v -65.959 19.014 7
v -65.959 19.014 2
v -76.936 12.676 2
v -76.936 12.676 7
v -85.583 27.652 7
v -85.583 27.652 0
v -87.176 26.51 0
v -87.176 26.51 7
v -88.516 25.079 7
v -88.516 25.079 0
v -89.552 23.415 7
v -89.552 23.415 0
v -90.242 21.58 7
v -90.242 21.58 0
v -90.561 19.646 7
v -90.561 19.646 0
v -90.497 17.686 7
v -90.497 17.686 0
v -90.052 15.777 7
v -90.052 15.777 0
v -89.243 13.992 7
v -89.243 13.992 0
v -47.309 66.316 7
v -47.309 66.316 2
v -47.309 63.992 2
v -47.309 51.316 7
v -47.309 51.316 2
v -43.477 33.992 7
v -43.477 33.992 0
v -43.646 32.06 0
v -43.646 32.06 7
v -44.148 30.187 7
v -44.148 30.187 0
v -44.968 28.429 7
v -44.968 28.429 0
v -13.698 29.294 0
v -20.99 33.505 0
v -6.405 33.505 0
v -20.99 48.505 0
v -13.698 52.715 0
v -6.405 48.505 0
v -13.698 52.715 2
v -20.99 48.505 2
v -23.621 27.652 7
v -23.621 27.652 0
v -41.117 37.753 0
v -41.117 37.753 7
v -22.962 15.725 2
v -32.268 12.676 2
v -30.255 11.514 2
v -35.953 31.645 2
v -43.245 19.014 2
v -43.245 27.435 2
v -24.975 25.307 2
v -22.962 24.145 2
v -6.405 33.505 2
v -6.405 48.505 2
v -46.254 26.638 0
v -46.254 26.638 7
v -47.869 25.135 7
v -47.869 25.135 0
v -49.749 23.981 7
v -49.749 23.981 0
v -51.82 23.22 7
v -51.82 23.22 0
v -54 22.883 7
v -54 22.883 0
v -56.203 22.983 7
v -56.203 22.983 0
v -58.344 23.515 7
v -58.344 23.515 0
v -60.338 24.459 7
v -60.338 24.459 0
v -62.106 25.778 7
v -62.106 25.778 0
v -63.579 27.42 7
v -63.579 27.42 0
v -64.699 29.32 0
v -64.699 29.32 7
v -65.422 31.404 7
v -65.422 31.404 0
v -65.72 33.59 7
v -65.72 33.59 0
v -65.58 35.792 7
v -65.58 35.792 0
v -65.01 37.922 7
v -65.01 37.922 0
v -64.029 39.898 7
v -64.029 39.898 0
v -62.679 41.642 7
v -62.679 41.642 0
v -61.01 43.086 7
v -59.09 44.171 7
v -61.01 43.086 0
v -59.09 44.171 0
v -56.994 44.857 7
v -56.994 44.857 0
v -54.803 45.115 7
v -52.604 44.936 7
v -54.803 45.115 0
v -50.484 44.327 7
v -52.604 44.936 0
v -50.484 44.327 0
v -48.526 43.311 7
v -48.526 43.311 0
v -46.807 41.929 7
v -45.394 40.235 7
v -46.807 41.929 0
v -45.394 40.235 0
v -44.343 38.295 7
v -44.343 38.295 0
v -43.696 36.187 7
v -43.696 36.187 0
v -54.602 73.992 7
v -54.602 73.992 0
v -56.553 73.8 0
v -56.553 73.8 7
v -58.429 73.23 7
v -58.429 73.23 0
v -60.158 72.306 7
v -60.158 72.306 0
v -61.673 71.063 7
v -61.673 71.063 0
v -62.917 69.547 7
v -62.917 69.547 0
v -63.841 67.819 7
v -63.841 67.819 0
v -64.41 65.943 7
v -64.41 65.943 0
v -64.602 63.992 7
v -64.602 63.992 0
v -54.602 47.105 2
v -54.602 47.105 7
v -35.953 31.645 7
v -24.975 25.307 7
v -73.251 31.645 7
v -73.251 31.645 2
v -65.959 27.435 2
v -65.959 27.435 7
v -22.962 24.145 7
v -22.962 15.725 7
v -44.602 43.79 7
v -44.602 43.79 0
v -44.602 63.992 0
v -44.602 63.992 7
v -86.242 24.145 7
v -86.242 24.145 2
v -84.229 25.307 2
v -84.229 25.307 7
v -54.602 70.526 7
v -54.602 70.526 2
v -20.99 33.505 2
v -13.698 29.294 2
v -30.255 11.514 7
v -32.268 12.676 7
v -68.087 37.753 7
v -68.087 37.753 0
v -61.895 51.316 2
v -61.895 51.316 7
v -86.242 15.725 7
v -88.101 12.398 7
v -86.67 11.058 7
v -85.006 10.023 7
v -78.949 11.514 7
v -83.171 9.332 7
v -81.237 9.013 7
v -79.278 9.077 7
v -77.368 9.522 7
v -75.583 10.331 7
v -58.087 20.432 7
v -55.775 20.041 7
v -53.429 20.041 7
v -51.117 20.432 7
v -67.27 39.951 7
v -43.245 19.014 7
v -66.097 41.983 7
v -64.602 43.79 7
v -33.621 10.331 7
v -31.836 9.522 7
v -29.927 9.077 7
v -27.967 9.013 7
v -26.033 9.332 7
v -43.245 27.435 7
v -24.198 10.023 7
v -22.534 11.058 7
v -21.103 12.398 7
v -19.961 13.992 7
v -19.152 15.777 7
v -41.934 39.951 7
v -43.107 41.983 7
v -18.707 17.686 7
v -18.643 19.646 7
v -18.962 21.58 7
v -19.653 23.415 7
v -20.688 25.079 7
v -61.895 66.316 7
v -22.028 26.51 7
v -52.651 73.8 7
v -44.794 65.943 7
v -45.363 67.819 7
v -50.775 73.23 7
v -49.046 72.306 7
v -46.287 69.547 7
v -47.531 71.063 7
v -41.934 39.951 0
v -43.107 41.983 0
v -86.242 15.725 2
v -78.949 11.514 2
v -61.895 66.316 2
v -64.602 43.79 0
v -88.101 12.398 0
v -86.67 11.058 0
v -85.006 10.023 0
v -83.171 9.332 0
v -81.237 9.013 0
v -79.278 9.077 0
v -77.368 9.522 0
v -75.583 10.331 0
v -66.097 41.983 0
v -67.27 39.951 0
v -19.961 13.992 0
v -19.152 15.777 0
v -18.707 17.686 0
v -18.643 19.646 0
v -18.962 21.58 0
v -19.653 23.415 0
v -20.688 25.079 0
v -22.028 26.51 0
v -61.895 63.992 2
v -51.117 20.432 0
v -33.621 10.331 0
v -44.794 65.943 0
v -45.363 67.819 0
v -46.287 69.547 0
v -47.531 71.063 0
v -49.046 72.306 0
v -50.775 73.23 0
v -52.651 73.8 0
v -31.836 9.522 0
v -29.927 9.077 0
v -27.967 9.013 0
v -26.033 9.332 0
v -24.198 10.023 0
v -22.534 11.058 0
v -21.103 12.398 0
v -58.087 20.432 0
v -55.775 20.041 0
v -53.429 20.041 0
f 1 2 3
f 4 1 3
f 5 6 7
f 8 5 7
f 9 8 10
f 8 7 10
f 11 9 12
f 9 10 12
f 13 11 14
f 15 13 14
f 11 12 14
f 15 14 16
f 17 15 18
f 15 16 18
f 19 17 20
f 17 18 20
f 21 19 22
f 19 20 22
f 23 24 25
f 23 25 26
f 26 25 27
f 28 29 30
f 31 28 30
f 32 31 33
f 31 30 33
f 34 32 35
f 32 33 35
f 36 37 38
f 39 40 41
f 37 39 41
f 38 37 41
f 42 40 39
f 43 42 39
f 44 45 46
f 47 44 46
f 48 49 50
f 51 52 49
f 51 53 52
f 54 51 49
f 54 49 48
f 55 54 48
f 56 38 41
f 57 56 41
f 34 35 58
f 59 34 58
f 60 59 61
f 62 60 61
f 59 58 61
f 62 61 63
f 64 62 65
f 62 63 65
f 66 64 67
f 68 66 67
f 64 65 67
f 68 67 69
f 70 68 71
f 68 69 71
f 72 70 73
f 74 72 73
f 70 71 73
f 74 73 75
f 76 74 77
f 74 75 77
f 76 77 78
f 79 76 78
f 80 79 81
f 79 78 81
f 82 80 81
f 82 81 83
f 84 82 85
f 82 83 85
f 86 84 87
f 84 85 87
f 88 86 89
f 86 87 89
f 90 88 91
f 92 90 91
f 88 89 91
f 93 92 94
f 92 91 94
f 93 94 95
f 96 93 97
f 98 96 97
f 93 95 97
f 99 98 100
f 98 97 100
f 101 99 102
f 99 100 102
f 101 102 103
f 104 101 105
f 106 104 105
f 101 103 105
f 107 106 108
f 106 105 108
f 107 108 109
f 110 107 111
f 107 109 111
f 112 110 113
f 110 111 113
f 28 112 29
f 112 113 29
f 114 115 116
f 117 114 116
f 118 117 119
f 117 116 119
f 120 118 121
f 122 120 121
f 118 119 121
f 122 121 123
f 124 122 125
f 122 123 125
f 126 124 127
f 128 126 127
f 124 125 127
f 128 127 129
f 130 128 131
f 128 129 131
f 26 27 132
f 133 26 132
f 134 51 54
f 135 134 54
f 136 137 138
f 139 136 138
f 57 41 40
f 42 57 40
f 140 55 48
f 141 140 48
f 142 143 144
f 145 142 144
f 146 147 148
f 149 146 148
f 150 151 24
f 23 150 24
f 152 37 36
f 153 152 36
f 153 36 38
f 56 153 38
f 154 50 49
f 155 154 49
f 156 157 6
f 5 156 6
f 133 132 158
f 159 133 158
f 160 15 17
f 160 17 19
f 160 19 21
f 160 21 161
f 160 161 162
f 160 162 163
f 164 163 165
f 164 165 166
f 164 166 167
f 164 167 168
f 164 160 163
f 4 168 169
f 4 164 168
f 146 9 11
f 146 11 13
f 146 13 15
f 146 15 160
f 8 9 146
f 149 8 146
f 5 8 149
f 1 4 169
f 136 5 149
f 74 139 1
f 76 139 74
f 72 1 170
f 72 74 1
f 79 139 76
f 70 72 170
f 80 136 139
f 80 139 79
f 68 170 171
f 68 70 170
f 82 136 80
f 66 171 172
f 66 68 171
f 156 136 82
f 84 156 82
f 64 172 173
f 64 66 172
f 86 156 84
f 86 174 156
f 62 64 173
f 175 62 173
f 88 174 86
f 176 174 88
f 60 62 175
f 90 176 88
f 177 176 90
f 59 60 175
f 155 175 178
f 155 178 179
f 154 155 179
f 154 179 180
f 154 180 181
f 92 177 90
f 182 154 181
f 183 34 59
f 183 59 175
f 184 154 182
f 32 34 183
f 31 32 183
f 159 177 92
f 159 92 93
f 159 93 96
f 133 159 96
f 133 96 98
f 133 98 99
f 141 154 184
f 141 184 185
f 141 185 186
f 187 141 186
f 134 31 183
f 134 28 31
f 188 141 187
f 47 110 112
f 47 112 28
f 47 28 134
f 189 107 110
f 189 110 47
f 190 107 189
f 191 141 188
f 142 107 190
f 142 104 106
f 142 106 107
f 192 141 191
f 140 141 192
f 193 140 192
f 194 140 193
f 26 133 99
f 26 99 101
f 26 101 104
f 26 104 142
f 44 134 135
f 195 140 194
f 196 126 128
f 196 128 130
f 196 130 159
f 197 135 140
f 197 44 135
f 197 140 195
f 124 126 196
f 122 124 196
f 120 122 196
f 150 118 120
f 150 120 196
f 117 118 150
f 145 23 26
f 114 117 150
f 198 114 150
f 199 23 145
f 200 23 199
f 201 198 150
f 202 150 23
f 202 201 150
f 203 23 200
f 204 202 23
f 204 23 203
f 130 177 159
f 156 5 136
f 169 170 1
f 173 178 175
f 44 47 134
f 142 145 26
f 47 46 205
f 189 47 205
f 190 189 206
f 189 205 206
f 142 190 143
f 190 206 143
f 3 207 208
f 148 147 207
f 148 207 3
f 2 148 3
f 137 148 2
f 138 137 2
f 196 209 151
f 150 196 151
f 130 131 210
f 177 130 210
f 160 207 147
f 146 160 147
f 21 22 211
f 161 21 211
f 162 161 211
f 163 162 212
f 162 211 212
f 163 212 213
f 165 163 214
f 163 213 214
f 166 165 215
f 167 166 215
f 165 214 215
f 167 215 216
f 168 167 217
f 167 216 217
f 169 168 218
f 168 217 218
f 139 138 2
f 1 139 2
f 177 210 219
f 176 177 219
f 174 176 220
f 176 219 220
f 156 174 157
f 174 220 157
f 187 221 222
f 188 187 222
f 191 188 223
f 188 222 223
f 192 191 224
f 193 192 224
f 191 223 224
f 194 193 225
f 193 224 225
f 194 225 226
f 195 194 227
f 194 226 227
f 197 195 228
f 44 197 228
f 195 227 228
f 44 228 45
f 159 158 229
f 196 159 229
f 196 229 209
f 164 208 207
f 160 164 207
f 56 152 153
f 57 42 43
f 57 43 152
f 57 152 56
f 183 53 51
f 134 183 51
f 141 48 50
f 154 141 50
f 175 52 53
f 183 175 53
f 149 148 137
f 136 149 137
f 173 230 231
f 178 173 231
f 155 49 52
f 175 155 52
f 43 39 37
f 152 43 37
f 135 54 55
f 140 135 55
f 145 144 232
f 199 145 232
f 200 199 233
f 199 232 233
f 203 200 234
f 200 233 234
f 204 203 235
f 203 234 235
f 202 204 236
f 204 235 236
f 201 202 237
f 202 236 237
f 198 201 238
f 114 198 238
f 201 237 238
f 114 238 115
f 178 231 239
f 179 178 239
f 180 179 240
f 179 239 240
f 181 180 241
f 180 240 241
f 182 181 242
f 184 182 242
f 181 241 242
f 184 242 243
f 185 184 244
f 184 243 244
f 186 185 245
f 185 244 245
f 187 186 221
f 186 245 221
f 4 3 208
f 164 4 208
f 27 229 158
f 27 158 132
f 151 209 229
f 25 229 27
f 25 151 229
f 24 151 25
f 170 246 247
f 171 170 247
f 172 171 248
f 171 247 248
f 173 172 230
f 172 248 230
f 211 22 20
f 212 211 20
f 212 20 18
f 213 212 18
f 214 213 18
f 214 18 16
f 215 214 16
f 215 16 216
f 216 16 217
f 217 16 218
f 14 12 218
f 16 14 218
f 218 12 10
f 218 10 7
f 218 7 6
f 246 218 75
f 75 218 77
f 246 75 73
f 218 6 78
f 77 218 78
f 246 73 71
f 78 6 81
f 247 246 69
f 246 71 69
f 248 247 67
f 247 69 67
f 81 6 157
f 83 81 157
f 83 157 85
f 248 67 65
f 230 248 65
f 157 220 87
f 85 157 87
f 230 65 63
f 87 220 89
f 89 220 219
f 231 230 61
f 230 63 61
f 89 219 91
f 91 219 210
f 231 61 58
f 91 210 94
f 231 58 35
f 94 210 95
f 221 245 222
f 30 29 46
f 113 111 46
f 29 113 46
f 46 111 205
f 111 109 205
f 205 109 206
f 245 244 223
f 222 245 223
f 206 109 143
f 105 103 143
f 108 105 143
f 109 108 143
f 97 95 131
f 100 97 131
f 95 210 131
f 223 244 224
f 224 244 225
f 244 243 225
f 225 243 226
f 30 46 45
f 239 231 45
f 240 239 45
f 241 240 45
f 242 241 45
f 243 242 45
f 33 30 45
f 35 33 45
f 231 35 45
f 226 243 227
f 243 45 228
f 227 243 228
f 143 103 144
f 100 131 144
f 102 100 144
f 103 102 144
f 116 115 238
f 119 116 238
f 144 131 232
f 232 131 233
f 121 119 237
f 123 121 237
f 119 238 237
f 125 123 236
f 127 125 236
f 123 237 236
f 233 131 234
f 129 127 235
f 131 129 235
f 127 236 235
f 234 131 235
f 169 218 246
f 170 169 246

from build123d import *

# Parameters (mm, degrees)
F2_DEPTH = 7
F0_W     = 7.2926804423
F0_H     = 12.6761035989
F3_DEPTH = 2
F4_DEPTH = 2


with BuildPart() as f2:
    # F0 (on Top) → F2 (new body)
    with BuildSketch(Plane.XY):
        with BuildLine():
            Line((-47.3093725741, 63.991701901), (-44.6020530164, 63.991701901))
            ThreePointArc((-44.6020530164, 63.991701901), (-47.5309852046, 71.0627697128), (-54.6020530164, 73.991701901))
            Line((-54.6020530164, 73.991701901), (-54.6020530164, 70.5260293186))
            Line((-54.6020530164, 70.5260293186), (-47.3093725741, 66.3155983021))
            Line((-47.3093725741, 66.3155983021), (-47.3093725741, 63.991701901))
        make_face()
        with BuildLine():
            Line((-44.6020530164, 43.7896608721), (-44.6020530164, 63.991701901))
            Line((-44.6020530164, 63.991701901), (-47.3093725741, 63.991701901))
            Line((-47.3093725741, 63.991701901), (-47.3093725741, 51.3155983021))
            Line((-47.3093725741, 51.3155983021), (-54.6020530164, 47.1051672856))
            Line((-54.6020530164, 47.1051672856), (-54.6020530164, 45.116701901))
            ThreePointArc((-54.6020530164, 45.116701901), (-46.7354900757, 41.8582648417), (-43.4770530164, 33.991701901))
            ThreePointArc((-43.4770530164, 33.991701901), (-43.856128199, 31.1123400242), (-44.9675203993, 28.429201901))
            Line((-44.9675203993, 28.429201901), (-43.2454588617, 27.4349692086))
            Line((-43.2454588617, 27.4349692086), (-35.9527784194, 31.6454002251))
            Line((-35.9527784194, 31.6454002251), (-24.9749506817, 25.3073484257))
            Line((-24.9749506817, 25.3073484257), (-23.6212909029, 27.6519559388))
            Line((-23.6212909029, 27.6519559388), (-41.1167716422, 37.7529764532))
            ThreePointArc((-41.1167716422, 37.7529764532), (-42.4776973634, 40.991701901), (-44.6020530164, 43.7896608721))
        make_face()
        with BuildLine():
            Line((-54.6020530164, 70.5260293186), (-54.6020530164, 73.991701901))
            ThreePointArc((-54.6020530164, 73.991701901), (-61.6731208283, 71.0627697128), (-64.6020530164, 63.991701901))
            Line((-64.6020530164, 63.991701901), (-61.8947334588, 63.991701901))
            Line((-61.8947334588, 63.991701901), (-61.8947334588, 66.3155983021))
            Line((-61.8947334588, 66.3155983021), (-54.6020530164, 70.5260293186))
        make_face()
        with BuildLine():
            Line((-61.8947334588, 63.991701901), (-64.6020530164, 63.991701901))
            Line((-64.6020530164, 63.991701901), (-64.6020530164, 43.7896608721))
            ThreePointArc((-64.6020530164, 43.7896608721), (-66.7264086694, 40.991701901), (-68.0873343907, 37.7529764532))
            Line((-68.0873343907, 37.7529764532), (-85.58281513, 27.6519559388))
            Line((-85.58281513, 27.6519559388), (-84.2291553511, 25.3073484257))
            Line((-84.2291553511, 25.3073484257), (-73.2513276135, 31.6454002251))
            Line((-73.2513276135, 31.6454002251), (-65.9586471712, 27.4349692086))
            Line((-65.9586471712, 27.4349692086), (-64.2365856335, 28.429201901))
            ThreePointArc((-64.2365856335, 28.429201901), (-64.2365856335, 39.554201901), (-54.6020530164, 45.116701901))
            Line((-54.6020530164, 45.116701901), (-54.6020530164, 47.1051672856))
            Line((-54.6020530164, 47.1051672856), (-61.8947334588, 51.3155983021))
            Line((-61.8947334588, 51.3155983021), (-61.8947334588, 63.991701901))
        make_face()
        with BuildLine():
            ThreePointArc((-19.961036865, 13.991701901), (-18.96203264, 21.579892352), (-23.6212909029, 27.6519559388))
            Line((-23.6212909029, 27.6519559388), (-24.9749506817, 25.3073484257))
            Line((-24.9749506817, 25.3073484257), (-22.9623973626, 24.1454002251))
            Line((-22.9623973626, 24.1454002251), (-22.9623973626, 15.7245381922))
            Line((-22.9623973626, 15.7245381922), (-19.961036865, 13.991701901))
        make_face()
        with BuildLine():
            ThreePointArc((-33.6212909029, 10.3314478631), (-26.0331004519, 9.3324436381), (-19.961036865, 13.991701901))
            Line((-19.961036865, 13.991701901), (-22.9623973626, 15.7245381922))
            Line((-22.9623973626, 15.7245381922), (-30.2550778049, 11.5141071757))
            Line((-30.2550778049, 11.5141071757), (-32.2676311241, 12.6760553762))
            Line((-32.2676311241, 12.6760553762), (-33.6212909029, 10.3314478631))
        make_face()
        with BuildLine():
            Line((-84.2291553511, 25.3073484257), (-85.58281513, 27.6519559388))
            ThreePointArc((-85.58281513, 27.6519559388), (-90.2420733928, 21.579892352), (-89.2430691678, 13.991701901))
            Line((-89.2430691678, 13.991701901), (-86.2417086703, 15.7245381922))
            Line((-86.2417086703, 15.7245381922), (-86.2417086703, 24.1454002251))
            Line((-86.2417086703, 24.1454002251), (-84.2291553511, 25.3073484257))
        make_face()
        with BuildLine():
            ThreePointArc((-44.9675203993, 28.429201901), (-54.6020530164, 22.866701901), (-64.2365856335, 28.429201901))
            Line((-64.2365856335, 28.429201901), (-65.9586471712, 27.4349692086))
            Line((-65.9586471712, 27.4349692086), (-65.9586471712, 19.0141071757))
            Line((-65.9586471712, 19.0141071757), (-76.9364749088, 12.6760553762))
            Line((-76.9364749088, 12.6760553762), (-75.58281513, 10.3314478631))
            Line((-75.58281513, 10.3314478631), (-58.0873343907, 20.4324683775))
            ThreePointArc((-58.0873343907, 20.4324683775), (-54.6020530164, 19.991701901), (-51.1167716422, 20.4324683775))
            Line((-51.1167716422, 20.4324683775), (-33.6212909029, 10.3314478631))
            Line((-33.6212909029, 10.3314478631), (-32.2676311241, 12.6760553762))
            Line((-32.2676311241, 12.6760553762), (-43.2454588617, 19.0141071757))
            Line((-43.2454588617, 19.0141071757), (-43.2454588617, 27.4349692086))
            Line((-43.2454588617, 27.4349692086), (-44.9675203993, 28.429201901))
        make_face()
        with BuildLine():
            Line((-86.2417086703, 15.7245381922), (-89.2430691678, 13.991701901))
            ThreePointArc((-89.2430691678, 13.991701901), (-83.171005581, 9.3324436381), (-75.58281513, 10.3314478631))
            Line((-75.58281513, 10.3314478631), (-76.9364749088, 12.6760553762))
            Line((-76.9364749088, 12.6760553762), (-78.9490282279, 11.5141071757))
            Line((-78.9490282279, 11.5141071757), (-86.2417086703, 15.7245381922))
        make_face()
    extrude(amount=F2_DEPTH)

    # F0 (on Top) → F3 (join)
    with BuildSketch(Plane.XY):
        Polygon((-54.6020530164, 63.991701901), (-54.6020530164, 70.5260293186), (-61.8947334588, 66.3155983021), (-61.8947334588, 63.991701901), align=None)
        Polygon((-54.6020530164, 63.991701901), (-47.3093725741, 63.991701901), (-47.3093725741, 66.3155983021), (-54.6020530164, 70.5260293186), align=None)
        with Locations((-50.9557127953, 57.6536501015)):
            Rectangle(F0_W, F0_H)
        with Locations((-58.2483932376, 57.6536501015)):
            Rectangle(F0_W, F0_H)
        Polygon((-54.6020530164, 47.1051672856), (-47.3093725741, 51.3155983021), (-54.6020530164, 51.3155983021), align=None)
        Polygon((-54.6020530164, 47.1051672856), (-54.6020530164, 51.3155983021), (-61.8947334588, 51.3155983021), align=None)
        Polygon((-73.2513276135, 31.6454002251), (-84.2291553511, 25.3073484257), (-80.58281513, 18.991701901), (-69.6049873923, 25.3297537004), align=None)
        Polygon((-69.6049873923, 25.3297537004), (-65.9586471712, 27.4349692086), (-73.2513276135, 31.6454002251), align=None)
        Polygon((-65.9586471712, 19.0141071757), (-65.9586471712, 27.4349692086), (-69.6049873923, 25.3297537004), align=None)
        Polygon((-69.6049873923, 25.3297537004), (-80.58281513, 18.991701901), (-76.9364749088, 12.6760553762), (-65.9586471712, 19.0141071757), align=None)
        Polygon((-76.9364749088, 12.6760553762), (-80.58281513, 18.991701901), (-86.2417086703, 15.7245381922), (-78.9490282279, 11.5141071757), align=None)
        Polygon((-80.58281513, 18.991701901), (-84.2291553511, 25.3073484257), (-86.2417086703, 24.1454002251), (-86.2417086703, 15.7245381922), align=None)
        Polygon((-32.2676311241, 12.6760553762), (-28.6212909029, 18.991701901), (-39.5991186405, 25.3297537004), (-43.2454588617, 19.0141071757), align=None)
        Polygon((-22.9623973626, 15.7245381922), (-28.6212909029, 18.991701901), (-32.2676311241, 12.6760553762), (-30.2550778049, 11.5141071757), align=None)
        Polygon((-22.9623973626, 24.1454002251), (-24.9749506817, 25.3073484257), (-28.6212909029, 18.991701901), (-22.9623973626, 15.7245381922), align=None)
        Polygon((-28.6212909029, 18.991701901), (-24.9749506817, 25.3073484257), (-35.9527784194, 31.6454002251), (-39.5991186405, 25.3297537004), align=None)
        Polygon((-39.5991186405, 25.3297537004), (-35.9527784194, 31.6454002251), (-43.2454588617, 27.4349692086), align=None)
        Polygon((-39.5991186405, 25.3297537004), (-43.2454588617, 27.4349692086), (-43.2454588617, 19.0141071757), align=None)
    extrude(amount=F3_DEPTH)


with BuildPart() as f4:
    # F1 (on face) → F4 (new body)
    with BuildSketch(Plane.XY):
        Polygon((-6.404850632, 33.5046689212), (-6.404850632, 48.5046689212), (-13.6975310743, 52.7150999377), (-20.9902115166, 48.5046689212), (-20.9902115166, 33.5046689212), (-13.6975310743, 29.2942379047), align=None)
    extrude(amount=F4_DEPTH)


solid = Compound([f2.part, f4.part])
